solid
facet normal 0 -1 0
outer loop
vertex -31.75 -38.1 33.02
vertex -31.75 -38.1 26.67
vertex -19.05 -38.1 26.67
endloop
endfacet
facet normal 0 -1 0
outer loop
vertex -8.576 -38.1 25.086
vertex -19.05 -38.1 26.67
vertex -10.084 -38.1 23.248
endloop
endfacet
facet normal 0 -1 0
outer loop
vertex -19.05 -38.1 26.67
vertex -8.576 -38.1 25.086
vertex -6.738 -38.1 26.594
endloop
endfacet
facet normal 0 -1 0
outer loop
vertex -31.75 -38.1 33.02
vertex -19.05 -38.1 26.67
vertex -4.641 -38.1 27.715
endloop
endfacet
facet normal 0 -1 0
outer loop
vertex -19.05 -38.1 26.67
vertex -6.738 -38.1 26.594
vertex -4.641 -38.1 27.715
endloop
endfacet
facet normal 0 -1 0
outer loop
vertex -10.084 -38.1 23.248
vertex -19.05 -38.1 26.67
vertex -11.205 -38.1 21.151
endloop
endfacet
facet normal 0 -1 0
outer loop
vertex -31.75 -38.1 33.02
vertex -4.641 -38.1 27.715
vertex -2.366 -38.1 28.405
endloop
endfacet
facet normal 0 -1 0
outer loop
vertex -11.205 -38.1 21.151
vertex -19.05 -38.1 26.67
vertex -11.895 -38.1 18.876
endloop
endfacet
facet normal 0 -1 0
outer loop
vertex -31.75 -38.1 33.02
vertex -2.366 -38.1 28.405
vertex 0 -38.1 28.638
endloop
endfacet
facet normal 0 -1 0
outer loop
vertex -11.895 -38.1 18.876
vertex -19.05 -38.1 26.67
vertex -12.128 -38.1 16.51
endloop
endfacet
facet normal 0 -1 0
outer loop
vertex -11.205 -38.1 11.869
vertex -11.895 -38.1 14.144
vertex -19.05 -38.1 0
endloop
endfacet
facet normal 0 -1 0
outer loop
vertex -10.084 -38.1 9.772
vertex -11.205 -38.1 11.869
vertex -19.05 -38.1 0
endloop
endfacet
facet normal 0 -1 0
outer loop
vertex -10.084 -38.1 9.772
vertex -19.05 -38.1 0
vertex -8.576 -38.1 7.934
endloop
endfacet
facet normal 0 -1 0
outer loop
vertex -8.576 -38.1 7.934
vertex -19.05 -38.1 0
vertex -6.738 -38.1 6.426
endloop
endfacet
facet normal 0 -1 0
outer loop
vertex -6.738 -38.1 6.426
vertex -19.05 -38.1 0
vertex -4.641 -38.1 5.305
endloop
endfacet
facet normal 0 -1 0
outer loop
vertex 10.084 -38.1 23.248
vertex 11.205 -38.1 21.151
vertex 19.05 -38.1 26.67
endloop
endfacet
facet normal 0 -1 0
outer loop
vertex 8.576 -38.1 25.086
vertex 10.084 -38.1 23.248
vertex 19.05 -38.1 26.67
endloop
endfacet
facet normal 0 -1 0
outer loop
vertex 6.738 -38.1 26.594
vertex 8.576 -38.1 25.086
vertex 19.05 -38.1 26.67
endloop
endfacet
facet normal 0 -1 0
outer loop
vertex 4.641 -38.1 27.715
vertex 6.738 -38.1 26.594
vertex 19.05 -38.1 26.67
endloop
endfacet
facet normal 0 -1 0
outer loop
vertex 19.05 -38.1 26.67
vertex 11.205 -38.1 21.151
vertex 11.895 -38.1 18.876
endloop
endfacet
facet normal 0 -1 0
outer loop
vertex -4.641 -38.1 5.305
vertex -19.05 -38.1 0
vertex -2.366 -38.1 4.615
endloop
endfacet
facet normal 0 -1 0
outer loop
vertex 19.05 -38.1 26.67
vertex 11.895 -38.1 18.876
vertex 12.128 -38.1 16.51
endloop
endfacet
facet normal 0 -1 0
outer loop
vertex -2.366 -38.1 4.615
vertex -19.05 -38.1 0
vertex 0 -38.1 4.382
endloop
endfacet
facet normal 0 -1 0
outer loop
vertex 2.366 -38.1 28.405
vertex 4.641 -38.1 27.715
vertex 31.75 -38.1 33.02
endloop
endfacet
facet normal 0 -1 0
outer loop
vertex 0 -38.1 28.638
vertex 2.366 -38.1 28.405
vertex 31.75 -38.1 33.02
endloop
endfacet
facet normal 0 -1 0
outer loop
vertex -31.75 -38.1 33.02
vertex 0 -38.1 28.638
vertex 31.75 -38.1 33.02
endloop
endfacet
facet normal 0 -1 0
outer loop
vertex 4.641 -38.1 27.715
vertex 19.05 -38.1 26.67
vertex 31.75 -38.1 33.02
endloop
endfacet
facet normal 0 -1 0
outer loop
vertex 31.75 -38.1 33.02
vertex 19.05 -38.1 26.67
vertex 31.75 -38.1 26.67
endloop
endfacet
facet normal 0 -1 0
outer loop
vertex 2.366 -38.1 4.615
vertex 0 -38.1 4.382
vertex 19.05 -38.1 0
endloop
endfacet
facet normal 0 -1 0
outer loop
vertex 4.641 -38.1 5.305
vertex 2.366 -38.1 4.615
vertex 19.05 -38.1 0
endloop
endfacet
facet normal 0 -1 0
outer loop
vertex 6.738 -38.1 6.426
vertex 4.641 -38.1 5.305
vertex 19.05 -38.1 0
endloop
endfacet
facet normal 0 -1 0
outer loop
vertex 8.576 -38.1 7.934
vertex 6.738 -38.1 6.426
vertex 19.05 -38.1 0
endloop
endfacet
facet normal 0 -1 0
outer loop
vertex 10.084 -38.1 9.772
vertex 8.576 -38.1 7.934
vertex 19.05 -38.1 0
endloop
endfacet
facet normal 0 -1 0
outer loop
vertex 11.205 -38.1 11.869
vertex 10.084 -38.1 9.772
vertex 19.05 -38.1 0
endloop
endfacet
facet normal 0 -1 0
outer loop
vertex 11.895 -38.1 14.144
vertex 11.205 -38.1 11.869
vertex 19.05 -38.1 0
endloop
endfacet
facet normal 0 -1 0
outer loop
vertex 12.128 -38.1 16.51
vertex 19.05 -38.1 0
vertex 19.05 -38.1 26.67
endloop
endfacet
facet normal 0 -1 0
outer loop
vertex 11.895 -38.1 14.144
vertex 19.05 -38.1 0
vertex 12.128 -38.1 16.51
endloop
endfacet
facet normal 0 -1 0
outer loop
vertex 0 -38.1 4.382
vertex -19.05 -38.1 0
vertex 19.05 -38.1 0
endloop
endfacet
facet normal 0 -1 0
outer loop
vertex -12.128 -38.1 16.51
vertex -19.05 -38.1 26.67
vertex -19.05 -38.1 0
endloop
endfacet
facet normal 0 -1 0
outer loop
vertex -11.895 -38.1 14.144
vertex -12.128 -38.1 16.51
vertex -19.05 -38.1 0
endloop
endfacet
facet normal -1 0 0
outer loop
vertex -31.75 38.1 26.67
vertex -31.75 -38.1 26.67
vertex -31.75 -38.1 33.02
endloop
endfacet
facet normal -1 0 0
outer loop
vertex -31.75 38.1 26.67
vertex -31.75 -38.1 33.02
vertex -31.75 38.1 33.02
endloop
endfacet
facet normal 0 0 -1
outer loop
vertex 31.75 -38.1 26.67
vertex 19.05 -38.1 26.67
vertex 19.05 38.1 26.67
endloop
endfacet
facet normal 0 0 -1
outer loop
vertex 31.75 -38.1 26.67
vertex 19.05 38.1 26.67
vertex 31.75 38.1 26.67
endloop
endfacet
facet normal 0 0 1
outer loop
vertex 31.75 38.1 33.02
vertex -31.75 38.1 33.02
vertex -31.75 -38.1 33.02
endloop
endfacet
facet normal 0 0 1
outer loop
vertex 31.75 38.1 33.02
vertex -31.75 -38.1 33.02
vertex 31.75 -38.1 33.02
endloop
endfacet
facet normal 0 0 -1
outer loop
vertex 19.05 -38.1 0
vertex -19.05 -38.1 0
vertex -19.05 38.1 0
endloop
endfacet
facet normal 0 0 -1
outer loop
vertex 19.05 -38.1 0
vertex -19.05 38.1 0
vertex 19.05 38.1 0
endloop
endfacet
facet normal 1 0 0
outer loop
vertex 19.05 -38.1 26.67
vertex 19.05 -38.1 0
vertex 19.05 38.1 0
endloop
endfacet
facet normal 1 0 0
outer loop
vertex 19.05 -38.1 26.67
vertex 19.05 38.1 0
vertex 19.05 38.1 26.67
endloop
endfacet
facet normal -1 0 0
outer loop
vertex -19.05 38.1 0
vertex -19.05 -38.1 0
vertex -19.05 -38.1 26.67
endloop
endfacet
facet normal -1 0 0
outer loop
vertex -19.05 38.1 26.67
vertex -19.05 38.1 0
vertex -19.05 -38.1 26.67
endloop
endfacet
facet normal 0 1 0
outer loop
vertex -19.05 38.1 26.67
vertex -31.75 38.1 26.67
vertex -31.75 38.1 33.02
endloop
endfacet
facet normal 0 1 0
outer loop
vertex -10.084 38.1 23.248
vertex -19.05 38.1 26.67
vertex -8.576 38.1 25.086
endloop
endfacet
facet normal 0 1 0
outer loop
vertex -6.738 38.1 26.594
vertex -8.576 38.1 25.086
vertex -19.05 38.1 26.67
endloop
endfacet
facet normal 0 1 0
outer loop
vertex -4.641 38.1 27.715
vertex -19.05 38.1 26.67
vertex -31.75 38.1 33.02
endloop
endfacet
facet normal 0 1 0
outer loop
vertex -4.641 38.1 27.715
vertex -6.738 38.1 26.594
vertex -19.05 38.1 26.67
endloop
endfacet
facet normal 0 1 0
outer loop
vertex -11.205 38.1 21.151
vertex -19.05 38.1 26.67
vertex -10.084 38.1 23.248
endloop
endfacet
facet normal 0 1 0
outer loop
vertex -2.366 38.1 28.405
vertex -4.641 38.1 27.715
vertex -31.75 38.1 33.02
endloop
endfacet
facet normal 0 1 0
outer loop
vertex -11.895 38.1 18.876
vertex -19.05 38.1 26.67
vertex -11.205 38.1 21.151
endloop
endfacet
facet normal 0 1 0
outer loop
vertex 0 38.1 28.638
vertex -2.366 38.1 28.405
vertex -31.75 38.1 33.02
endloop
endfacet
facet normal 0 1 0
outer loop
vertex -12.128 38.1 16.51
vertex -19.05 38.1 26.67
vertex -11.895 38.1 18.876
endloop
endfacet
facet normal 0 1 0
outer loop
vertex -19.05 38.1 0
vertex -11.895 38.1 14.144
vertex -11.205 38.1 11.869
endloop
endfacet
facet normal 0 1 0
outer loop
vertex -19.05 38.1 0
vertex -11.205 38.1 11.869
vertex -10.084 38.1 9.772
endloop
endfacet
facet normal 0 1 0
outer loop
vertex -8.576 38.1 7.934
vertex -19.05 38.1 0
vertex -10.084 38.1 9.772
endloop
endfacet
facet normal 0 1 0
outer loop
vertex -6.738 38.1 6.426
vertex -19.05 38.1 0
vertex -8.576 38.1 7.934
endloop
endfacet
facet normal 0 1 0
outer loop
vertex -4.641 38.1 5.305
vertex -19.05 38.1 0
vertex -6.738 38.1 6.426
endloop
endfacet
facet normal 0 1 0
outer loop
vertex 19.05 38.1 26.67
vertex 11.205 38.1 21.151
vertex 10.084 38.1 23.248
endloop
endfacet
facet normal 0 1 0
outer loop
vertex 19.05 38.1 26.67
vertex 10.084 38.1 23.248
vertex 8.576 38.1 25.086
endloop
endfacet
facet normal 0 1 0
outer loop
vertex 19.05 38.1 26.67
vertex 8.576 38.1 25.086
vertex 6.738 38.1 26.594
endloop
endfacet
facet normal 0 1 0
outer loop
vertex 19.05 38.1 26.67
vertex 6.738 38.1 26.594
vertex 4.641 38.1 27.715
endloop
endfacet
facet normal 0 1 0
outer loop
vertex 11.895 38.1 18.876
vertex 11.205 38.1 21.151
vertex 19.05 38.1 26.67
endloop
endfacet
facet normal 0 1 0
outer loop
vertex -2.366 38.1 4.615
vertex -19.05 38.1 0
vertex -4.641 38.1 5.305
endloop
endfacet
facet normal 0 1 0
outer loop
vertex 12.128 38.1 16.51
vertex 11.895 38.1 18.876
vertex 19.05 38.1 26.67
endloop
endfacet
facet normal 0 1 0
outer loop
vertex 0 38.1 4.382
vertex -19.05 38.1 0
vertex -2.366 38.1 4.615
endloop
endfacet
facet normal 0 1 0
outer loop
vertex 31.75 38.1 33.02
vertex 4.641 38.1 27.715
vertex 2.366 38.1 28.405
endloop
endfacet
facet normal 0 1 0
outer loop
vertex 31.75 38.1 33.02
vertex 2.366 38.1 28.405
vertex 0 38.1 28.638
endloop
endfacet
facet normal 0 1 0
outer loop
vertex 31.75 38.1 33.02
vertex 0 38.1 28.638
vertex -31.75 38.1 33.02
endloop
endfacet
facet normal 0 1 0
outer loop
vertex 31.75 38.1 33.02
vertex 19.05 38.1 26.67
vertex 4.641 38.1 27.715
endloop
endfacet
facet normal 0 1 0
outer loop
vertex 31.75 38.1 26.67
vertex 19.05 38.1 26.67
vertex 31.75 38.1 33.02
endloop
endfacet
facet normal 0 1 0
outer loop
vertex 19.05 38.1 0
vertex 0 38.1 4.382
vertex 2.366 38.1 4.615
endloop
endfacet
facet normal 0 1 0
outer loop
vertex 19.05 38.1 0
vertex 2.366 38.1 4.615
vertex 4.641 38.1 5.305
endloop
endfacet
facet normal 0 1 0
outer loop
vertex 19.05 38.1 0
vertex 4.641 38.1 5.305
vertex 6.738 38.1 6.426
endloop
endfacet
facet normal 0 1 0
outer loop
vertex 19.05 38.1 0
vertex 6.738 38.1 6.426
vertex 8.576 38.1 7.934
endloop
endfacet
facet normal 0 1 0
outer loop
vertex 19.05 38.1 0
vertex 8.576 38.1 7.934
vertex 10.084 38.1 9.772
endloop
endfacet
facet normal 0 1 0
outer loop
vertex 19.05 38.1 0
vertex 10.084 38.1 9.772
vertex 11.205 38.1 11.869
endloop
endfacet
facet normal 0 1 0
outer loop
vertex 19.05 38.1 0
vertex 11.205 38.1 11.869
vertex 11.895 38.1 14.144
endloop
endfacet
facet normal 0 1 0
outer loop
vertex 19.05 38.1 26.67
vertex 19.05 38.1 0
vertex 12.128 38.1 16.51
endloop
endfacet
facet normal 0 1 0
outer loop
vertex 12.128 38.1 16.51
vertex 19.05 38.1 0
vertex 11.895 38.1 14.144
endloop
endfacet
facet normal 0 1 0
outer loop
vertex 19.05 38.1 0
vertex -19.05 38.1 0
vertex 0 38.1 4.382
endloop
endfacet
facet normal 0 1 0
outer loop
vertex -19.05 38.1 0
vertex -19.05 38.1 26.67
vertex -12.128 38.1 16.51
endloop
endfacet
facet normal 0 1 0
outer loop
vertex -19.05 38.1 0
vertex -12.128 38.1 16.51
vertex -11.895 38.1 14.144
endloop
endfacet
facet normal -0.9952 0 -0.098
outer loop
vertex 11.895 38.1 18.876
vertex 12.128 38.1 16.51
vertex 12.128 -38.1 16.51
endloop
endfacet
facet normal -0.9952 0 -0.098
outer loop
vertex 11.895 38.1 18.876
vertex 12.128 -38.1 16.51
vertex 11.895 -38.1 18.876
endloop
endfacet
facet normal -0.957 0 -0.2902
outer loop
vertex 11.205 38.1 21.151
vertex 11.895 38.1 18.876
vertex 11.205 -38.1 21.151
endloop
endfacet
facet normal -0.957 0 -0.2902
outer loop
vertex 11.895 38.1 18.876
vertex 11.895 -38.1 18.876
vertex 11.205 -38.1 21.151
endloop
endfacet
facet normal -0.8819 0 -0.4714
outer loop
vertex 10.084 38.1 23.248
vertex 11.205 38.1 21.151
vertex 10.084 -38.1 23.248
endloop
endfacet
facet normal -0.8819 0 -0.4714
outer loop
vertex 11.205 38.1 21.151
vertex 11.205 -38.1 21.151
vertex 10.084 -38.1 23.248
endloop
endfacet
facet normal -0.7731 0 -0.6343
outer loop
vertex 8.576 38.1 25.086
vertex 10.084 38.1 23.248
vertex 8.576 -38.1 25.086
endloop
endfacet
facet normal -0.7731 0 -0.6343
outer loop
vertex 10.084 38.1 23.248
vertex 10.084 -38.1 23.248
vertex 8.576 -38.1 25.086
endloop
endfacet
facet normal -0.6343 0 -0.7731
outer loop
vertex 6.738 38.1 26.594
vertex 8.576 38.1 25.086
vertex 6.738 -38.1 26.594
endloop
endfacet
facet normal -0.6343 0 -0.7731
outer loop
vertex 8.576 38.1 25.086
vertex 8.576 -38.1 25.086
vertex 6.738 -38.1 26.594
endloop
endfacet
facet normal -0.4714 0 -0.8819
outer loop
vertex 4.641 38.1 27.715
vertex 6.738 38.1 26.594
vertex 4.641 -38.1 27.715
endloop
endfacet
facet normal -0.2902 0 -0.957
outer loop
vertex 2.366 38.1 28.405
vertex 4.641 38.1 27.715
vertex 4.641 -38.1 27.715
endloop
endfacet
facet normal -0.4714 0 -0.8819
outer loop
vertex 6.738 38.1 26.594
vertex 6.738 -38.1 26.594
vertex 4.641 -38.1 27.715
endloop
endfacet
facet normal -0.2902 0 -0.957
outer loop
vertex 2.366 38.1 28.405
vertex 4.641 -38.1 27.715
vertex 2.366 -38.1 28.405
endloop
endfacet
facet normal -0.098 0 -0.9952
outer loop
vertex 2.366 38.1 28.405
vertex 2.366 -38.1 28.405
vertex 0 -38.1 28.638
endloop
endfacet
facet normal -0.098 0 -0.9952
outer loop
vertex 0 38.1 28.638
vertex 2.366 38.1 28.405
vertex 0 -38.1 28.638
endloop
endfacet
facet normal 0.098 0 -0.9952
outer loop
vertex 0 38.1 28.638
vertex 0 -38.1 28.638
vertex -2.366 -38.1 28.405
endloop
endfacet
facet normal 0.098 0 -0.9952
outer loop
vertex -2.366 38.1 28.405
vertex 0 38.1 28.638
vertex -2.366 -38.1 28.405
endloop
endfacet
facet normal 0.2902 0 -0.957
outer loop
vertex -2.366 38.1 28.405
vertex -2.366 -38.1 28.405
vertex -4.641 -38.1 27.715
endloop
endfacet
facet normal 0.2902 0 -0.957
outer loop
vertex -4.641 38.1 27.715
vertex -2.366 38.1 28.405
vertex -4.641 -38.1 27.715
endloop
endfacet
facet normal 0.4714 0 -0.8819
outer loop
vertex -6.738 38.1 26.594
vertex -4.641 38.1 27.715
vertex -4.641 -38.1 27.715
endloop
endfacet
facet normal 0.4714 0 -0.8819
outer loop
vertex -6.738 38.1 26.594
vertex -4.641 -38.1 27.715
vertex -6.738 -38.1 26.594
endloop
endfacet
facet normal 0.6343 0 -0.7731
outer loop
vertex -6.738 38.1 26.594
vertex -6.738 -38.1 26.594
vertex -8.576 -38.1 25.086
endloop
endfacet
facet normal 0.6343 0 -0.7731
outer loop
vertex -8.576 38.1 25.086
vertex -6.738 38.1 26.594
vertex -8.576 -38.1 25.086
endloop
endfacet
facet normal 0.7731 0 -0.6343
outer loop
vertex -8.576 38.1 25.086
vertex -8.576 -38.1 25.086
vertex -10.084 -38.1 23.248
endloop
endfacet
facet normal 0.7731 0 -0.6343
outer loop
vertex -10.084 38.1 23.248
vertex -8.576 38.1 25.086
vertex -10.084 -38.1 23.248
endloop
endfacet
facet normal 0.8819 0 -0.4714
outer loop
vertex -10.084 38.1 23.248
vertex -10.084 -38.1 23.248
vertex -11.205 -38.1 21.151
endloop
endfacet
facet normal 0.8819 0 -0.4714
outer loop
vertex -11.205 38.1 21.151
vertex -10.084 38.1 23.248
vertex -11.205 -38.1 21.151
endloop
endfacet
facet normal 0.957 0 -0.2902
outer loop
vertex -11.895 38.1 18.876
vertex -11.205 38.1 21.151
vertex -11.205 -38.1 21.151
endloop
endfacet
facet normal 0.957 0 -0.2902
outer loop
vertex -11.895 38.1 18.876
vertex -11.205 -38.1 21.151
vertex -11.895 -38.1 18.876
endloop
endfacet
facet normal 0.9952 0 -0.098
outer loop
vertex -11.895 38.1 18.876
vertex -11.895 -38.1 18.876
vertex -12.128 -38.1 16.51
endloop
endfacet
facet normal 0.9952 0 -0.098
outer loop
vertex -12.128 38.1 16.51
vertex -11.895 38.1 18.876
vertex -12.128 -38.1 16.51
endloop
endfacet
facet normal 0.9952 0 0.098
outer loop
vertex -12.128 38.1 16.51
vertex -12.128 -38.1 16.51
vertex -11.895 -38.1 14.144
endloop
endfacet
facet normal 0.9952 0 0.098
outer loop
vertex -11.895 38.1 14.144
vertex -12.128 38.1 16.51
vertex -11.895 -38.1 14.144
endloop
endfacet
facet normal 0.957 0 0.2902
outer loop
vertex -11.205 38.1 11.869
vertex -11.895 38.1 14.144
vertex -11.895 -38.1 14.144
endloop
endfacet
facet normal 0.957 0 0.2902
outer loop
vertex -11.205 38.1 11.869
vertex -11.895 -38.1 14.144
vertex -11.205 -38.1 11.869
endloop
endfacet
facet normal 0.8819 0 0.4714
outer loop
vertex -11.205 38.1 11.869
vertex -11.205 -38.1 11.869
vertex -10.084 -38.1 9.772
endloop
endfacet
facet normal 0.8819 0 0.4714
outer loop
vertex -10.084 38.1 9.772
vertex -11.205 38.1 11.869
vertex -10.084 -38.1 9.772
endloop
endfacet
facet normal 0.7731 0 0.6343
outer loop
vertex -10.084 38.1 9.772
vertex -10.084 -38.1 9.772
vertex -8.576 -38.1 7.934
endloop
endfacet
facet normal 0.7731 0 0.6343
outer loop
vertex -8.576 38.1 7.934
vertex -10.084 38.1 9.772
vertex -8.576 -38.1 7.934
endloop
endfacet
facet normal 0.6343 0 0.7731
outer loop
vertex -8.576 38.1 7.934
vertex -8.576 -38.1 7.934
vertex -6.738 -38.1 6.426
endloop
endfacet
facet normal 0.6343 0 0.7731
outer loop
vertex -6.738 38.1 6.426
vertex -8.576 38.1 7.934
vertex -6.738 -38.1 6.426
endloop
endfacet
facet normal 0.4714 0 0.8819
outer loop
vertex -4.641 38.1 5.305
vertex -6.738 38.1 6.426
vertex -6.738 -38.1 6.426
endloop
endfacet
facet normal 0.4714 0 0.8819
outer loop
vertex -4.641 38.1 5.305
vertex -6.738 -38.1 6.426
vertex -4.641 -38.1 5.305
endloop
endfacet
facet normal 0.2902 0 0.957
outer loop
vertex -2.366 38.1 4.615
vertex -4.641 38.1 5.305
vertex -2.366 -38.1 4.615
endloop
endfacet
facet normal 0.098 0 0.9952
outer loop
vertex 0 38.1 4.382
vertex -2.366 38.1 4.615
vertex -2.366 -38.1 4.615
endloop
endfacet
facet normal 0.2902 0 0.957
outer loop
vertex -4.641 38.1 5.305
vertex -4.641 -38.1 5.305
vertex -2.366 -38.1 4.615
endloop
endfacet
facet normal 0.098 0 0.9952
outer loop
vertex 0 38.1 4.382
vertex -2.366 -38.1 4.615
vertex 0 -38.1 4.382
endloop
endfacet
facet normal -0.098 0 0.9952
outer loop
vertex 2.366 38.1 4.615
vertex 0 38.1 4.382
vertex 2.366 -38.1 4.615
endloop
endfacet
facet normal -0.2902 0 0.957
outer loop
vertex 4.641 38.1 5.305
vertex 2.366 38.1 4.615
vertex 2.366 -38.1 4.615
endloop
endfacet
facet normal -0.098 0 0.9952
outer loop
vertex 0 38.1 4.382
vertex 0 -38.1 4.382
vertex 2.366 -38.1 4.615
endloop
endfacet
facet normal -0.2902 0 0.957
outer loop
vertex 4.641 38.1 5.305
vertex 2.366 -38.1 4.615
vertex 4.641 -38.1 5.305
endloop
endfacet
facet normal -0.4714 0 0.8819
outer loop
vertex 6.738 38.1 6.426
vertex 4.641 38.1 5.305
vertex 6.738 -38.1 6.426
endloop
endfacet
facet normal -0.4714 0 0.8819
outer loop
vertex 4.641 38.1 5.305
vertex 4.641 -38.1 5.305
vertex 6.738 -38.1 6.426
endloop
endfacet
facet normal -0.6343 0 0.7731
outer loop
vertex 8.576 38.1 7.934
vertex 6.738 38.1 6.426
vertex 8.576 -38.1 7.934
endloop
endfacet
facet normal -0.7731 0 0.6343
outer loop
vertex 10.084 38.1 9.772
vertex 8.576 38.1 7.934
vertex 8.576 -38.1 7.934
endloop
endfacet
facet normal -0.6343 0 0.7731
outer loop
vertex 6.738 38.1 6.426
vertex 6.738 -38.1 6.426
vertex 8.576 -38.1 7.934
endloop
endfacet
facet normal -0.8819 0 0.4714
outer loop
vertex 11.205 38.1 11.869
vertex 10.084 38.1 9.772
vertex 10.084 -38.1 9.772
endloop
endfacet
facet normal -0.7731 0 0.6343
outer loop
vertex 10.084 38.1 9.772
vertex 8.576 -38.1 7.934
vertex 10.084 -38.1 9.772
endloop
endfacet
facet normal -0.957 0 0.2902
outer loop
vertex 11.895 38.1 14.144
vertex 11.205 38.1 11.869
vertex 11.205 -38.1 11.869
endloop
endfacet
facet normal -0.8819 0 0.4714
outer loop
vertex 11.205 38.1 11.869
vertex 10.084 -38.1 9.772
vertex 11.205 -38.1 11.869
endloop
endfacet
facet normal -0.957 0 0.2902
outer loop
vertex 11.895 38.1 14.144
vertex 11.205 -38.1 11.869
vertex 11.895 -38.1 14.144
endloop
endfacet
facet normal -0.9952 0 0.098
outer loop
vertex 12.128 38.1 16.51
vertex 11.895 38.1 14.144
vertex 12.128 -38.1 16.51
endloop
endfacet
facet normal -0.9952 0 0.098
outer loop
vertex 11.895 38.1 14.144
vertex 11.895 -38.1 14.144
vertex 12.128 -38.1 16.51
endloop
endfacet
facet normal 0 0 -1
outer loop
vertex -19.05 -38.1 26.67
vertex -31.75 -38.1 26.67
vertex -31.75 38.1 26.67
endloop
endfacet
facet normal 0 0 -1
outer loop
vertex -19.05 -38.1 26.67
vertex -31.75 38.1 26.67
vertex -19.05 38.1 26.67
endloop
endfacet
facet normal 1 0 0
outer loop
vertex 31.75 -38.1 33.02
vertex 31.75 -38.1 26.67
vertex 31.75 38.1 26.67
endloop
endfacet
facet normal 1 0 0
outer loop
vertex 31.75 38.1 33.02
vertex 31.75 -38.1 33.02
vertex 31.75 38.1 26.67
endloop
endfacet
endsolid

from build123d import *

# Parameters (mm, degrees)
F0_W     = 63.5
F0_H     = 76.2
F1_DEPTH = 33.02
F2_R     = 12.1285
F3_DEPTH = 100.076
F4_W     = 12.7
F4_H     = 26.67
F5_DEPTH = 76.201


# Not quite as in the source:
# - a feature names something its author has since deleted; it is built from what else it names


with BuildPart() as f1:
    # F0 (on Top) → F1 (new body)
    with BuildSketch(Plane.XY):
        Rectangle(F0_W, F0_H)
    extrude(amount=F1_DEPTH)

    # F2 (on face) → F3 (cut)
    with BuildSketch(Plane.XZ.offset(38.1)):
        with Locations((0, 16.51)):
            Circle(F2_R)
    extrude(amount=-F3_DEPTH, mode=Mode.SUBTRACT)

    # F4 (on face) → F5 (cut, through all)
    with BuildSketch(Plane.XZ.offset(38.1)):
        with Locations((25.4, 13.335)):
            Rectangle(F4_W, F4_H)
        with Locations((-25.4, 13.335)):
            Rectangle(F4_W, F4_H)
    extrude(amount=-F5_DEPTH, mode=Mode.SUBTRACT)


solid = f1.part
